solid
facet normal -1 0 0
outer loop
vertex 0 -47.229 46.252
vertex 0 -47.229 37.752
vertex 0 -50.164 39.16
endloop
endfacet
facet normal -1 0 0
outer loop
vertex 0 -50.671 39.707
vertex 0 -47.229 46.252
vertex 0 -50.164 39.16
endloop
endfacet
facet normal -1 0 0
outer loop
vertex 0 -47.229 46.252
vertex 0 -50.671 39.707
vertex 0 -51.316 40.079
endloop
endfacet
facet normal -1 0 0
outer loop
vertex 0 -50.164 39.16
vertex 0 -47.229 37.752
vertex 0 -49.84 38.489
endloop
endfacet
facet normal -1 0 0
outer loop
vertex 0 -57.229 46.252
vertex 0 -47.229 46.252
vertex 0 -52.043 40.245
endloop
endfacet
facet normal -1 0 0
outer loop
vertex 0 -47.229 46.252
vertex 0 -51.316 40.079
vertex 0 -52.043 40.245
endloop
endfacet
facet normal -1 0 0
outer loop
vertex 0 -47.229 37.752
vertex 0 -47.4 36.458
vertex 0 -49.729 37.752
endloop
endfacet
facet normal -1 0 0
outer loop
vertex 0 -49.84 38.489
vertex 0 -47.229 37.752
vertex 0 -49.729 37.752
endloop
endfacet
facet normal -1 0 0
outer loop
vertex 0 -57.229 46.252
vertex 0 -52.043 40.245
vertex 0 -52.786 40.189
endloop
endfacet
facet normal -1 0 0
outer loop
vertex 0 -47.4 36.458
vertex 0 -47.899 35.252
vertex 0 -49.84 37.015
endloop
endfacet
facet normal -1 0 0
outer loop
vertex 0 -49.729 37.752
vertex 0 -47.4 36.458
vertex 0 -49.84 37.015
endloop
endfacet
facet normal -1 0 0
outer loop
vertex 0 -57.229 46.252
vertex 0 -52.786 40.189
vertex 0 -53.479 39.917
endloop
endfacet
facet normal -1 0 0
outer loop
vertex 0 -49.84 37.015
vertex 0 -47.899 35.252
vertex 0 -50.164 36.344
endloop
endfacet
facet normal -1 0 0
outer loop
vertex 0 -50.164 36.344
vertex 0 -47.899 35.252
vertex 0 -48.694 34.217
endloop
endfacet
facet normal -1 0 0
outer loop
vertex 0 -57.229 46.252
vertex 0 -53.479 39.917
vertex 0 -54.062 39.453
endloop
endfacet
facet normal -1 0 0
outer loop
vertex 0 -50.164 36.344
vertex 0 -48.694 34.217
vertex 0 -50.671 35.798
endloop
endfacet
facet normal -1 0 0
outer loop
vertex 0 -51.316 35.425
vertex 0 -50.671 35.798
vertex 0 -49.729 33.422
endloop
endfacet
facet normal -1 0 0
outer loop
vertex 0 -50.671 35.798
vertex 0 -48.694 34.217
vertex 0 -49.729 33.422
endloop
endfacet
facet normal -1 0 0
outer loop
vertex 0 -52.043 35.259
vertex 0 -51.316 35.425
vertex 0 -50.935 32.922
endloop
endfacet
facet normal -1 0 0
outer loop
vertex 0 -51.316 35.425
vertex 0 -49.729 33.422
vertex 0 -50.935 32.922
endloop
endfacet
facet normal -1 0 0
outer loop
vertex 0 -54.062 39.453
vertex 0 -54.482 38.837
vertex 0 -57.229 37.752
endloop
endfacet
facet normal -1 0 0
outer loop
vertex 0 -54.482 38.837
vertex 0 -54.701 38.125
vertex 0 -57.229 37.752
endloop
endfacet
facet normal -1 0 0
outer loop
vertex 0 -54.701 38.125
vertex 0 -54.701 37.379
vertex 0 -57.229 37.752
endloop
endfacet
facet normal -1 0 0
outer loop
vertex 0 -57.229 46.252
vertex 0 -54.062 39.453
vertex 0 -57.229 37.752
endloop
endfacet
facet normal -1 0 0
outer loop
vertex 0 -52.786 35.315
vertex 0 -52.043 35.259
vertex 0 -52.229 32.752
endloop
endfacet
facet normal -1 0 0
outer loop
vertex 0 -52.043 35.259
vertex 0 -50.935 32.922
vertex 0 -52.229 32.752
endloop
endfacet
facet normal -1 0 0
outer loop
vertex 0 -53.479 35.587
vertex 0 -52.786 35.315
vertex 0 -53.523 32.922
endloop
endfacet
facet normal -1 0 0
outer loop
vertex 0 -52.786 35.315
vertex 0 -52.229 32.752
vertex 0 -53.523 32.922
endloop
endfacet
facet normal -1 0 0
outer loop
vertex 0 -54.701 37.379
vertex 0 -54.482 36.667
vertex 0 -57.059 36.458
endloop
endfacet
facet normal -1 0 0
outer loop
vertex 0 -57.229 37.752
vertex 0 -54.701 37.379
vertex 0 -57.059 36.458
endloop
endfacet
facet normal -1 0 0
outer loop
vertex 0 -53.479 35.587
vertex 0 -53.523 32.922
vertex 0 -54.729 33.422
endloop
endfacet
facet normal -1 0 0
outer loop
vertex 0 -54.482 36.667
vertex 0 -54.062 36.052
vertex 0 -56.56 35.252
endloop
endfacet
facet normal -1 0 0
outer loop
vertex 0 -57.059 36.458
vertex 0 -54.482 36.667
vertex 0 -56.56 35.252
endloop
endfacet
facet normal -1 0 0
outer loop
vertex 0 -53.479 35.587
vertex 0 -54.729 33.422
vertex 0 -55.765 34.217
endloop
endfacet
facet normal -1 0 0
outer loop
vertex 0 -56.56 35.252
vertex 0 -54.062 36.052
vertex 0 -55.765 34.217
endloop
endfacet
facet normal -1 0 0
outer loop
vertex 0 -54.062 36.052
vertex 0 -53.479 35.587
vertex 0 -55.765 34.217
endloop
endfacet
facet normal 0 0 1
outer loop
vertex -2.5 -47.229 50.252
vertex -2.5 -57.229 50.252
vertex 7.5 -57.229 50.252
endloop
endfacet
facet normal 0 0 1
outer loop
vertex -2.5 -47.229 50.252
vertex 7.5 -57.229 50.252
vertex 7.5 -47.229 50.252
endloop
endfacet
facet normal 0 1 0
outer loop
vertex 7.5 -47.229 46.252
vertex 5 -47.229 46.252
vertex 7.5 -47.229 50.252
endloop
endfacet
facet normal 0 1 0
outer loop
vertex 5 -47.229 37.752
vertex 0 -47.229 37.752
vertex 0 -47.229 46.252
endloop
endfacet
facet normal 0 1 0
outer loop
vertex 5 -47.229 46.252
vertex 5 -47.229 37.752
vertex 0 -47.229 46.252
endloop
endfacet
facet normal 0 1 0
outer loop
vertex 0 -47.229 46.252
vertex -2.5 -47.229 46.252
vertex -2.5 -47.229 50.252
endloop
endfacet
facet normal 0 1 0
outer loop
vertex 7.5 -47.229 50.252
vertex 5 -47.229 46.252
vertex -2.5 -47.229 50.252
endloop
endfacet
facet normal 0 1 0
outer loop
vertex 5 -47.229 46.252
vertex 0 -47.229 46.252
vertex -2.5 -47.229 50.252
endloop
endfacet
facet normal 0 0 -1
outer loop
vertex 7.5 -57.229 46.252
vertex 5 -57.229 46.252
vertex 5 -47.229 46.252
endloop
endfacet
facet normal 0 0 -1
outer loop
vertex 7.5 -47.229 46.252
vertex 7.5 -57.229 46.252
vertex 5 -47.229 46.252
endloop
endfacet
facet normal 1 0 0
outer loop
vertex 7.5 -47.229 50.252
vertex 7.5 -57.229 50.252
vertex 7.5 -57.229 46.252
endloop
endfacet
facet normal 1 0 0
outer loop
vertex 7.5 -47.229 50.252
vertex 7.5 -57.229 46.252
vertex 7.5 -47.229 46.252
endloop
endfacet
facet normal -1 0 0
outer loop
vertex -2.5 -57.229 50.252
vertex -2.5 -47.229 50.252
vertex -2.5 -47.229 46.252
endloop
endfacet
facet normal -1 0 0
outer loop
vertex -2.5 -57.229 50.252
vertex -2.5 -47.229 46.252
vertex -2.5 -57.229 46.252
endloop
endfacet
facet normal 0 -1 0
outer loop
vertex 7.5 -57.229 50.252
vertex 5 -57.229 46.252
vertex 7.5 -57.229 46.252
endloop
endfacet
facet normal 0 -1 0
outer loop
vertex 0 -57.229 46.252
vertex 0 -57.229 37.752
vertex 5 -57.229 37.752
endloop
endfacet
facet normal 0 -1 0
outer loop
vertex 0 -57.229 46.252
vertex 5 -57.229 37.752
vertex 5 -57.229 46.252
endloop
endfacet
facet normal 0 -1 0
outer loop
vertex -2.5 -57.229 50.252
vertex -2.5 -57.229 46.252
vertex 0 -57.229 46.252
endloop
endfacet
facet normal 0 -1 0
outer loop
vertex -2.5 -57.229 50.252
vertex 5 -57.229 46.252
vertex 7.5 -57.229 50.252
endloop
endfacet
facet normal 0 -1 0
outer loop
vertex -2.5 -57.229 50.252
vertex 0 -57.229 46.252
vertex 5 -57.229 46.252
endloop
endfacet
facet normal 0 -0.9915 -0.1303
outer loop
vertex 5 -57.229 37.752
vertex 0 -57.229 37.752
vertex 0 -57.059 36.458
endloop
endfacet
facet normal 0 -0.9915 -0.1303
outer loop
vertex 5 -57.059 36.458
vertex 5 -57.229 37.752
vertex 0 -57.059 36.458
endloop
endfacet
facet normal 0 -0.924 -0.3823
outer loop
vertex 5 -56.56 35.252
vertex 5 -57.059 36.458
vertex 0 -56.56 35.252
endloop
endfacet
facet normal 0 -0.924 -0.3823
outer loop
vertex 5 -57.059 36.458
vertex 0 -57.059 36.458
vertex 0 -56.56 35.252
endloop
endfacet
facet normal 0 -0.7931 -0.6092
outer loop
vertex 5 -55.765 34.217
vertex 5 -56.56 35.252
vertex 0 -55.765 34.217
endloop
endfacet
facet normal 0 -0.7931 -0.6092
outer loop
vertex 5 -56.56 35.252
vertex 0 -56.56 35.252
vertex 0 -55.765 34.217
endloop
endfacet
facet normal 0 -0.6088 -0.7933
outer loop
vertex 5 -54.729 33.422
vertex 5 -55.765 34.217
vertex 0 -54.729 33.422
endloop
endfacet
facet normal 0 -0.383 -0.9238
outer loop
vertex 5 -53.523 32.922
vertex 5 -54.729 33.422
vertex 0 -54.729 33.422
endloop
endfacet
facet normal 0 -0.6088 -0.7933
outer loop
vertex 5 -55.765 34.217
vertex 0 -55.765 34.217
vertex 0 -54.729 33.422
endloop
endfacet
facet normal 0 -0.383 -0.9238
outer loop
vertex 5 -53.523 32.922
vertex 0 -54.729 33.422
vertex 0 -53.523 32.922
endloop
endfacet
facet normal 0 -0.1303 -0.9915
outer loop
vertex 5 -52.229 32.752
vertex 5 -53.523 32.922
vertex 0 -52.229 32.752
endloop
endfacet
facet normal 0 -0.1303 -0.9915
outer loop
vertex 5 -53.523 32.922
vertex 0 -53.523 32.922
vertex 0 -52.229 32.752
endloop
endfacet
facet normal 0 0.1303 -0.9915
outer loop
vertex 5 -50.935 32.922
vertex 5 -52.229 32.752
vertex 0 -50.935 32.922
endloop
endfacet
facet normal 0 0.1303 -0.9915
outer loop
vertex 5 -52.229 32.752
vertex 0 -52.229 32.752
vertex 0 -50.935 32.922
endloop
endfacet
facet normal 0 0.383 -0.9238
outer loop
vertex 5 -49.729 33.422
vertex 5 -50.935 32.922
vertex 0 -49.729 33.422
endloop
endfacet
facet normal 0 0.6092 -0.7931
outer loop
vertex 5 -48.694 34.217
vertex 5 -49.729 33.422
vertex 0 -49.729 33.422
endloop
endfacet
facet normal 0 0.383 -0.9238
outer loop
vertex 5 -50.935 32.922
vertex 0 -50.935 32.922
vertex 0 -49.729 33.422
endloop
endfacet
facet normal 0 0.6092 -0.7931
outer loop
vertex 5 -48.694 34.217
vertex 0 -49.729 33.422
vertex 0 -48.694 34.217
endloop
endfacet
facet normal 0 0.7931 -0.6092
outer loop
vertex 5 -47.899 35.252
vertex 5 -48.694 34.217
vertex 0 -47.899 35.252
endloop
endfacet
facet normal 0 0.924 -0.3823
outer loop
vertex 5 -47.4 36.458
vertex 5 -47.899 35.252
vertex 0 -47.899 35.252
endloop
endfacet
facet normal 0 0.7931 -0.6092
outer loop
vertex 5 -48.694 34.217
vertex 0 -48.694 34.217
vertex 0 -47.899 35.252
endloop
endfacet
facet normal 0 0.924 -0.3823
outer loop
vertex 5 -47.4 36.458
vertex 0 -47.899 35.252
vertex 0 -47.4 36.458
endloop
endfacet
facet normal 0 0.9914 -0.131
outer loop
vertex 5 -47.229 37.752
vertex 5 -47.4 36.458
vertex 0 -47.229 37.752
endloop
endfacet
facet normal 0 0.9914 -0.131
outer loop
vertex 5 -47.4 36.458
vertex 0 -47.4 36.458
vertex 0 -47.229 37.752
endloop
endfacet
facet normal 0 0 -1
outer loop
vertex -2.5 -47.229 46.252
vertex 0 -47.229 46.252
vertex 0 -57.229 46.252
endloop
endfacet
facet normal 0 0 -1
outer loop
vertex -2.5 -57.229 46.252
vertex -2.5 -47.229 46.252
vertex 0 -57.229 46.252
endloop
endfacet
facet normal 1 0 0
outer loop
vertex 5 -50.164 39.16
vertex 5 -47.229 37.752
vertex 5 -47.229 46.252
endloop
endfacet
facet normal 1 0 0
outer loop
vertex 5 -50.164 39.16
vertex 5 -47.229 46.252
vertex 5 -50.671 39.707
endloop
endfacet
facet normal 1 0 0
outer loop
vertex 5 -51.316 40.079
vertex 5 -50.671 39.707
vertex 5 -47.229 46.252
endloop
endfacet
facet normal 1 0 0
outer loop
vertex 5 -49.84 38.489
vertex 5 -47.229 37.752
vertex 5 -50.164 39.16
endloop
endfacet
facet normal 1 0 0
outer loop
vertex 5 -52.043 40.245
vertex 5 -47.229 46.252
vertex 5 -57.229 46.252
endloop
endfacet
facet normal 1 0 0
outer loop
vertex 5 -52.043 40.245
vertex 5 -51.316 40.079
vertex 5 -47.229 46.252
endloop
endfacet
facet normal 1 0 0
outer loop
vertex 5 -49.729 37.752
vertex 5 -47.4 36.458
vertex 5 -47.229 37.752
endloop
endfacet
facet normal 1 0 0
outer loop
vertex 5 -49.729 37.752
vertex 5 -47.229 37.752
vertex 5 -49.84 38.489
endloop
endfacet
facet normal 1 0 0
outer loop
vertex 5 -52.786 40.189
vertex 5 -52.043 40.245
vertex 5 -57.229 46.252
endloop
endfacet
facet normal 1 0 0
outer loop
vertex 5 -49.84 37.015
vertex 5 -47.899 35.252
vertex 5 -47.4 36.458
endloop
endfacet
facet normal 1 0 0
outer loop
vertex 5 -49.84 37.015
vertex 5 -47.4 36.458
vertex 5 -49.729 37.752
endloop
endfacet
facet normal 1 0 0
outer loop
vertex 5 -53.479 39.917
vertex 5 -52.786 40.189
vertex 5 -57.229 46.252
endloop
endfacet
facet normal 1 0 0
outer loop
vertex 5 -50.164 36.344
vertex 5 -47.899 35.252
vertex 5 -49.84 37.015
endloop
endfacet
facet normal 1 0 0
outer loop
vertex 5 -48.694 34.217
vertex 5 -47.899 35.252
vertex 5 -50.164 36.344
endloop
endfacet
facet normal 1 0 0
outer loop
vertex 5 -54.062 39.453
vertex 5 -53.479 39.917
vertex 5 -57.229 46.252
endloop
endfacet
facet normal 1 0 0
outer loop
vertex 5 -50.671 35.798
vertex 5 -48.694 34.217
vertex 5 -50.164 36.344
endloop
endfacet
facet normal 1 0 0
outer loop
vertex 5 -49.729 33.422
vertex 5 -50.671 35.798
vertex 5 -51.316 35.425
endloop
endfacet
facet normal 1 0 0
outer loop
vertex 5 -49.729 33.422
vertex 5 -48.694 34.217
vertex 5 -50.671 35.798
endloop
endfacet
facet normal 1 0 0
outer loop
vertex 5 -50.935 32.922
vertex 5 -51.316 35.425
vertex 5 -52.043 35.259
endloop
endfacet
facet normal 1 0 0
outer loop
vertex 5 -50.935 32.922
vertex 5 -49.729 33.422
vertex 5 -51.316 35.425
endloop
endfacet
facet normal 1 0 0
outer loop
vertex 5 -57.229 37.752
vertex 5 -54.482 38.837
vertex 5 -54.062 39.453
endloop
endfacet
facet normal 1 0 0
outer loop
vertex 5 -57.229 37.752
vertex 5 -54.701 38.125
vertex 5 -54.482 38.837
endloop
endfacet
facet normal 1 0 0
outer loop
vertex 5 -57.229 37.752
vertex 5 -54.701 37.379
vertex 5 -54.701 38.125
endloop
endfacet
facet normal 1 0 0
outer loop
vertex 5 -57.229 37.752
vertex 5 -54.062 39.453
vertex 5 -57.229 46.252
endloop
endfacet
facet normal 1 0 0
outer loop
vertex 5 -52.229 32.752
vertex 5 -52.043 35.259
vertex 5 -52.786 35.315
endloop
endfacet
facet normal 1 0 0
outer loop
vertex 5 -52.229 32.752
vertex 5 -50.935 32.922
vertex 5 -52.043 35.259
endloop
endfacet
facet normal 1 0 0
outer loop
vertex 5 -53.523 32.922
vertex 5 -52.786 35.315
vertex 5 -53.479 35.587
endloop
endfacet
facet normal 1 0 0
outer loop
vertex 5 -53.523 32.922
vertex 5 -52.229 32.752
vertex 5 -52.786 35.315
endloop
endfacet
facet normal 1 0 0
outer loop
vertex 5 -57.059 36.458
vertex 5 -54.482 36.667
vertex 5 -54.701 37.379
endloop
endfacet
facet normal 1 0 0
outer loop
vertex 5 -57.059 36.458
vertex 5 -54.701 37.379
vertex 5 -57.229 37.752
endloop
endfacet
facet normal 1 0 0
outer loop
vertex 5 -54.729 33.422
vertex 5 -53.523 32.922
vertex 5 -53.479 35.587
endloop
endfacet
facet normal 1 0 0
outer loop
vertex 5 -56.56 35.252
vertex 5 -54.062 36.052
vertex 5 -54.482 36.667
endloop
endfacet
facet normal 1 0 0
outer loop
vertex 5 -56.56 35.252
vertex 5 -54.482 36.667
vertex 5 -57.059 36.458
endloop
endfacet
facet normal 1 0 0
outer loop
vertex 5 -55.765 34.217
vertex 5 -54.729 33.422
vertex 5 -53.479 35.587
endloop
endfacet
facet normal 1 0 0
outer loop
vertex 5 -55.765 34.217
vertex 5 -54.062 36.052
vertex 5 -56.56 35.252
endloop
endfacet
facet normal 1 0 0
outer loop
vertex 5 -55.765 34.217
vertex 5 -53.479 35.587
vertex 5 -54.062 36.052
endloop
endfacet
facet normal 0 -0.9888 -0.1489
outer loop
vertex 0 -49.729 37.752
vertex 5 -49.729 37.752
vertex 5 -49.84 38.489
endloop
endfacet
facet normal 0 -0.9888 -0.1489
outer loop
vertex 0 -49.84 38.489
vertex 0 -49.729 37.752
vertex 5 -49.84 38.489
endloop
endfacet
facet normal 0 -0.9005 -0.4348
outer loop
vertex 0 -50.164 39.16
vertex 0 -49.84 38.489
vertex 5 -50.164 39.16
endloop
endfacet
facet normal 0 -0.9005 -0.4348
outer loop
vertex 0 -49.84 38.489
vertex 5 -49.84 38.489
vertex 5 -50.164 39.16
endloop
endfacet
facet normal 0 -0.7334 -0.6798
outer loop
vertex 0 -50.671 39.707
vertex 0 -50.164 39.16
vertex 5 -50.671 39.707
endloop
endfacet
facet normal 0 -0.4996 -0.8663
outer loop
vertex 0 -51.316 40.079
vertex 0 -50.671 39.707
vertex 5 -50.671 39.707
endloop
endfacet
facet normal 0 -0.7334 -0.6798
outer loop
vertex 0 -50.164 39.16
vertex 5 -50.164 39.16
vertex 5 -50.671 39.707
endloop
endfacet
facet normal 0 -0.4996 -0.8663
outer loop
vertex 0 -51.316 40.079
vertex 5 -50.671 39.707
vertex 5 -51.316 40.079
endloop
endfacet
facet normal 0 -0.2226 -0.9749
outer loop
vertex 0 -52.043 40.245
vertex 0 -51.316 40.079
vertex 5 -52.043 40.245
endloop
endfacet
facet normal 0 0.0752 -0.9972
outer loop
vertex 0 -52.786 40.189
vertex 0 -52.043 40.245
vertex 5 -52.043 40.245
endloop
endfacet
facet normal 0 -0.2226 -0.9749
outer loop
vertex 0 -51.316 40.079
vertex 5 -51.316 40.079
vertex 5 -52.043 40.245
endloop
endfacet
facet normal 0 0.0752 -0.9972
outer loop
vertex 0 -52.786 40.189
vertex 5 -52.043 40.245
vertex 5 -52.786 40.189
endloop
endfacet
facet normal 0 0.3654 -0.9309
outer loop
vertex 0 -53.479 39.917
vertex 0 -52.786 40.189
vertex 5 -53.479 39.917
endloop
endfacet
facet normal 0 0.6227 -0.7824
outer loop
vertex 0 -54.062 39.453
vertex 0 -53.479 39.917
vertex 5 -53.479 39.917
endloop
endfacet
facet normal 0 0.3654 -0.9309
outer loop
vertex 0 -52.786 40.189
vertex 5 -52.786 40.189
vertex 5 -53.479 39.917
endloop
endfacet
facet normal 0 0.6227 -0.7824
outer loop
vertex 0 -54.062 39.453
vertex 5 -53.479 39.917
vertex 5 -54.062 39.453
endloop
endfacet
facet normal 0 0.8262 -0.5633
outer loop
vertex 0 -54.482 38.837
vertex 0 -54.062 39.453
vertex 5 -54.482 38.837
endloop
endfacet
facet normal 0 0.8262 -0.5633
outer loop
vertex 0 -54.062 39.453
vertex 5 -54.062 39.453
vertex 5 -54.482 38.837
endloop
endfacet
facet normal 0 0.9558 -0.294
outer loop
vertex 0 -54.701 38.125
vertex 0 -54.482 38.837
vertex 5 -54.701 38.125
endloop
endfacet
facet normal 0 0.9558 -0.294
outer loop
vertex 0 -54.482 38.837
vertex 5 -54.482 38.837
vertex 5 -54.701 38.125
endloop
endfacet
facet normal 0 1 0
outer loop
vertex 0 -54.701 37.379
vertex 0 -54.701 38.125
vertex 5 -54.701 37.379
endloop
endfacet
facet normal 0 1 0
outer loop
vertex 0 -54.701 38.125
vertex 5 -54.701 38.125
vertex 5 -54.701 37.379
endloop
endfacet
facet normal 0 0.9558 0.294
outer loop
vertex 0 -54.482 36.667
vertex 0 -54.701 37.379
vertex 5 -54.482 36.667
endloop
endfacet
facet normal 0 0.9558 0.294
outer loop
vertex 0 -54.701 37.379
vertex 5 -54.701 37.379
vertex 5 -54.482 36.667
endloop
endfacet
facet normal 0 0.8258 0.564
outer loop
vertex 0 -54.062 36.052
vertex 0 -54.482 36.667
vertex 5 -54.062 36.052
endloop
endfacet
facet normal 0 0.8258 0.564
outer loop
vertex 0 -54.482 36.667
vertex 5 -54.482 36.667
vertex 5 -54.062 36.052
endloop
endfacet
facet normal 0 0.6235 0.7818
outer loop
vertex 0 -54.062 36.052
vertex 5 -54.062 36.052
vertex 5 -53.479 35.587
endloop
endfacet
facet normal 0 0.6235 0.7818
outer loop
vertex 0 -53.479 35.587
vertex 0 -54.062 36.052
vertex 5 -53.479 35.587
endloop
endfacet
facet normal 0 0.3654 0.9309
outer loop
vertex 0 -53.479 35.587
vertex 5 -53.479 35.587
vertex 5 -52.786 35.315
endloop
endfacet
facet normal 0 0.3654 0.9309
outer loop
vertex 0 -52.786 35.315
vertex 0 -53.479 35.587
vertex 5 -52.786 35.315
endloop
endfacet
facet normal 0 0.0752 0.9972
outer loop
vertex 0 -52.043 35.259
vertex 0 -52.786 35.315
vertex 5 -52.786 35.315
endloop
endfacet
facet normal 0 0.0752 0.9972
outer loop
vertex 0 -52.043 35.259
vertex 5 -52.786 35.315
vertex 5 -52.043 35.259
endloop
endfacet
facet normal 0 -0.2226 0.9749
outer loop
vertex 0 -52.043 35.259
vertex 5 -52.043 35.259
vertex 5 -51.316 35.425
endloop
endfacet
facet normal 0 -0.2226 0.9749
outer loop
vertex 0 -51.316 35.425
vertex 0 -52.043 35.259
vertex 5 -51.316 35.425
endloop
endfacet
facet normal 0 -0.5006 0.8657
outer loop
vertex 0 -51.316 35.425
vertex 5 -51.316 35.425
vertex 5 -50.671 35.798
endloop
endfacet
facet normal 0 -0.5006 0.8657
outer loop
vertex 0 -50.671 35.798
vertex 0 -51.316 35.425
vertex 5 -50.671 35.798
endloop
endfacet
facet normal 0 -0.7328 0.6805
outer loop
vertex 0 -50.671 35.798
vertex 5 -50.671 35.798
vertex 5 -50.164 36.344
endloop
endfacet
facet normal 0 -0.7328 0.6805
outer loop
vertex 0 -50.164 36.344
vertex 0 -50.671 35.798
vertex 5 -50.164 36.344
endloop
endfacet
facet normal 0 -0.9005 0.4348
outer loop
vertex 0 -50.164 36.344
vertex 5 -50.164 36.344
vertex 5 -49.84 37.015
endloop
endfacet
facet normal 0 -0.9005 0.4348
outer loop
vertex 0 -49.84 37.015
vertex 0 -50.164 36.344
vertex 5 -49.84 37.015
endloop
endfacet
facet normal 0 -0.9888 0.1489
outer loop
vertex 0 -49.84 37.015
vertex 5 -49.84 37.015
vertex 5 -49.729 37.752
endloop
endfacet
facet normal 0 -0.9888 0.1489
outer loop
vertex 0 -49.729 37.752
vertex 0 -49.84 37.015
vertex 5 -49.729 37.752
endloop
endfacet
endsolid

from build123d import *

# Parameters (mm, degrees)
F1_DEPTH = 5
F3_D     = 5
F4_DEPTH = 7.5
F5_W     = 10
F5_H     = 4
F6_DEPTH = 2.5
F7_W     = 10
F7_H     = 4
F8_DEPTH = 2.5


with BuildPart() as f1:
    # F0 (on Right) → F1 (new body)
    with BuildSketch(Plane.YZ):
        with BuildLine():
            Line((-57.2294044495, 42.7520807087), (-57.2294044495, 37.7520807087))
            ThreePointArc((-57.2294044495, 37.7520807087), (-52.2294044495, 32.7520807087), (-47.2294044495, 37.7520807087))
            Line((-47.2294044495, 37.7520807087), (-47.2294044495, 42.7520807087))
            Line((-47.2294044495, 42.7520807087), (-57.2294044495, 42.7520807087))
        make_face()
    extrude(amount=F1_DEPTH)

    # F3 (through all)
    with Locations(Plane(origin=(0, 0, 0), x_dir=(0, -1, 0), z_dir=(-1, 0, 0))):
        with Locations((52.2294044495, 37.7520807087)):
            Hole(F3_D / 2)

    # F4 (add): a face of the model
    f4_faces = [f1.faces().sort_by_distance(p)[0] for p in [
        (2.5, -52.2294044495, 42.7520807087),
    ]]
    extrude(f4_faces, amount=F4_DEPTH)

    # F5 (on face) → F6 (join)
    with BuildSketch(Plane(origin=(0, 0, 0), x_dir=(0, -1, 0), z_dir=(-1, 0, 0))):
        with Locations((52.2294044495, 48.2520807087)):
            Rectangle(F5_W, F5_H)
    extrude(amount=F6_DEPTH)

    # F7 (on face) → F8 (join)
    with BuildSketch(Plane.YZ.offset(5)):
        with Locations((-52.2294044495, 48.2520807087)):
            Rectangle(F7_W, F7_H)
    extrude(amount=F8_DEPTH)


solid = f1.part
